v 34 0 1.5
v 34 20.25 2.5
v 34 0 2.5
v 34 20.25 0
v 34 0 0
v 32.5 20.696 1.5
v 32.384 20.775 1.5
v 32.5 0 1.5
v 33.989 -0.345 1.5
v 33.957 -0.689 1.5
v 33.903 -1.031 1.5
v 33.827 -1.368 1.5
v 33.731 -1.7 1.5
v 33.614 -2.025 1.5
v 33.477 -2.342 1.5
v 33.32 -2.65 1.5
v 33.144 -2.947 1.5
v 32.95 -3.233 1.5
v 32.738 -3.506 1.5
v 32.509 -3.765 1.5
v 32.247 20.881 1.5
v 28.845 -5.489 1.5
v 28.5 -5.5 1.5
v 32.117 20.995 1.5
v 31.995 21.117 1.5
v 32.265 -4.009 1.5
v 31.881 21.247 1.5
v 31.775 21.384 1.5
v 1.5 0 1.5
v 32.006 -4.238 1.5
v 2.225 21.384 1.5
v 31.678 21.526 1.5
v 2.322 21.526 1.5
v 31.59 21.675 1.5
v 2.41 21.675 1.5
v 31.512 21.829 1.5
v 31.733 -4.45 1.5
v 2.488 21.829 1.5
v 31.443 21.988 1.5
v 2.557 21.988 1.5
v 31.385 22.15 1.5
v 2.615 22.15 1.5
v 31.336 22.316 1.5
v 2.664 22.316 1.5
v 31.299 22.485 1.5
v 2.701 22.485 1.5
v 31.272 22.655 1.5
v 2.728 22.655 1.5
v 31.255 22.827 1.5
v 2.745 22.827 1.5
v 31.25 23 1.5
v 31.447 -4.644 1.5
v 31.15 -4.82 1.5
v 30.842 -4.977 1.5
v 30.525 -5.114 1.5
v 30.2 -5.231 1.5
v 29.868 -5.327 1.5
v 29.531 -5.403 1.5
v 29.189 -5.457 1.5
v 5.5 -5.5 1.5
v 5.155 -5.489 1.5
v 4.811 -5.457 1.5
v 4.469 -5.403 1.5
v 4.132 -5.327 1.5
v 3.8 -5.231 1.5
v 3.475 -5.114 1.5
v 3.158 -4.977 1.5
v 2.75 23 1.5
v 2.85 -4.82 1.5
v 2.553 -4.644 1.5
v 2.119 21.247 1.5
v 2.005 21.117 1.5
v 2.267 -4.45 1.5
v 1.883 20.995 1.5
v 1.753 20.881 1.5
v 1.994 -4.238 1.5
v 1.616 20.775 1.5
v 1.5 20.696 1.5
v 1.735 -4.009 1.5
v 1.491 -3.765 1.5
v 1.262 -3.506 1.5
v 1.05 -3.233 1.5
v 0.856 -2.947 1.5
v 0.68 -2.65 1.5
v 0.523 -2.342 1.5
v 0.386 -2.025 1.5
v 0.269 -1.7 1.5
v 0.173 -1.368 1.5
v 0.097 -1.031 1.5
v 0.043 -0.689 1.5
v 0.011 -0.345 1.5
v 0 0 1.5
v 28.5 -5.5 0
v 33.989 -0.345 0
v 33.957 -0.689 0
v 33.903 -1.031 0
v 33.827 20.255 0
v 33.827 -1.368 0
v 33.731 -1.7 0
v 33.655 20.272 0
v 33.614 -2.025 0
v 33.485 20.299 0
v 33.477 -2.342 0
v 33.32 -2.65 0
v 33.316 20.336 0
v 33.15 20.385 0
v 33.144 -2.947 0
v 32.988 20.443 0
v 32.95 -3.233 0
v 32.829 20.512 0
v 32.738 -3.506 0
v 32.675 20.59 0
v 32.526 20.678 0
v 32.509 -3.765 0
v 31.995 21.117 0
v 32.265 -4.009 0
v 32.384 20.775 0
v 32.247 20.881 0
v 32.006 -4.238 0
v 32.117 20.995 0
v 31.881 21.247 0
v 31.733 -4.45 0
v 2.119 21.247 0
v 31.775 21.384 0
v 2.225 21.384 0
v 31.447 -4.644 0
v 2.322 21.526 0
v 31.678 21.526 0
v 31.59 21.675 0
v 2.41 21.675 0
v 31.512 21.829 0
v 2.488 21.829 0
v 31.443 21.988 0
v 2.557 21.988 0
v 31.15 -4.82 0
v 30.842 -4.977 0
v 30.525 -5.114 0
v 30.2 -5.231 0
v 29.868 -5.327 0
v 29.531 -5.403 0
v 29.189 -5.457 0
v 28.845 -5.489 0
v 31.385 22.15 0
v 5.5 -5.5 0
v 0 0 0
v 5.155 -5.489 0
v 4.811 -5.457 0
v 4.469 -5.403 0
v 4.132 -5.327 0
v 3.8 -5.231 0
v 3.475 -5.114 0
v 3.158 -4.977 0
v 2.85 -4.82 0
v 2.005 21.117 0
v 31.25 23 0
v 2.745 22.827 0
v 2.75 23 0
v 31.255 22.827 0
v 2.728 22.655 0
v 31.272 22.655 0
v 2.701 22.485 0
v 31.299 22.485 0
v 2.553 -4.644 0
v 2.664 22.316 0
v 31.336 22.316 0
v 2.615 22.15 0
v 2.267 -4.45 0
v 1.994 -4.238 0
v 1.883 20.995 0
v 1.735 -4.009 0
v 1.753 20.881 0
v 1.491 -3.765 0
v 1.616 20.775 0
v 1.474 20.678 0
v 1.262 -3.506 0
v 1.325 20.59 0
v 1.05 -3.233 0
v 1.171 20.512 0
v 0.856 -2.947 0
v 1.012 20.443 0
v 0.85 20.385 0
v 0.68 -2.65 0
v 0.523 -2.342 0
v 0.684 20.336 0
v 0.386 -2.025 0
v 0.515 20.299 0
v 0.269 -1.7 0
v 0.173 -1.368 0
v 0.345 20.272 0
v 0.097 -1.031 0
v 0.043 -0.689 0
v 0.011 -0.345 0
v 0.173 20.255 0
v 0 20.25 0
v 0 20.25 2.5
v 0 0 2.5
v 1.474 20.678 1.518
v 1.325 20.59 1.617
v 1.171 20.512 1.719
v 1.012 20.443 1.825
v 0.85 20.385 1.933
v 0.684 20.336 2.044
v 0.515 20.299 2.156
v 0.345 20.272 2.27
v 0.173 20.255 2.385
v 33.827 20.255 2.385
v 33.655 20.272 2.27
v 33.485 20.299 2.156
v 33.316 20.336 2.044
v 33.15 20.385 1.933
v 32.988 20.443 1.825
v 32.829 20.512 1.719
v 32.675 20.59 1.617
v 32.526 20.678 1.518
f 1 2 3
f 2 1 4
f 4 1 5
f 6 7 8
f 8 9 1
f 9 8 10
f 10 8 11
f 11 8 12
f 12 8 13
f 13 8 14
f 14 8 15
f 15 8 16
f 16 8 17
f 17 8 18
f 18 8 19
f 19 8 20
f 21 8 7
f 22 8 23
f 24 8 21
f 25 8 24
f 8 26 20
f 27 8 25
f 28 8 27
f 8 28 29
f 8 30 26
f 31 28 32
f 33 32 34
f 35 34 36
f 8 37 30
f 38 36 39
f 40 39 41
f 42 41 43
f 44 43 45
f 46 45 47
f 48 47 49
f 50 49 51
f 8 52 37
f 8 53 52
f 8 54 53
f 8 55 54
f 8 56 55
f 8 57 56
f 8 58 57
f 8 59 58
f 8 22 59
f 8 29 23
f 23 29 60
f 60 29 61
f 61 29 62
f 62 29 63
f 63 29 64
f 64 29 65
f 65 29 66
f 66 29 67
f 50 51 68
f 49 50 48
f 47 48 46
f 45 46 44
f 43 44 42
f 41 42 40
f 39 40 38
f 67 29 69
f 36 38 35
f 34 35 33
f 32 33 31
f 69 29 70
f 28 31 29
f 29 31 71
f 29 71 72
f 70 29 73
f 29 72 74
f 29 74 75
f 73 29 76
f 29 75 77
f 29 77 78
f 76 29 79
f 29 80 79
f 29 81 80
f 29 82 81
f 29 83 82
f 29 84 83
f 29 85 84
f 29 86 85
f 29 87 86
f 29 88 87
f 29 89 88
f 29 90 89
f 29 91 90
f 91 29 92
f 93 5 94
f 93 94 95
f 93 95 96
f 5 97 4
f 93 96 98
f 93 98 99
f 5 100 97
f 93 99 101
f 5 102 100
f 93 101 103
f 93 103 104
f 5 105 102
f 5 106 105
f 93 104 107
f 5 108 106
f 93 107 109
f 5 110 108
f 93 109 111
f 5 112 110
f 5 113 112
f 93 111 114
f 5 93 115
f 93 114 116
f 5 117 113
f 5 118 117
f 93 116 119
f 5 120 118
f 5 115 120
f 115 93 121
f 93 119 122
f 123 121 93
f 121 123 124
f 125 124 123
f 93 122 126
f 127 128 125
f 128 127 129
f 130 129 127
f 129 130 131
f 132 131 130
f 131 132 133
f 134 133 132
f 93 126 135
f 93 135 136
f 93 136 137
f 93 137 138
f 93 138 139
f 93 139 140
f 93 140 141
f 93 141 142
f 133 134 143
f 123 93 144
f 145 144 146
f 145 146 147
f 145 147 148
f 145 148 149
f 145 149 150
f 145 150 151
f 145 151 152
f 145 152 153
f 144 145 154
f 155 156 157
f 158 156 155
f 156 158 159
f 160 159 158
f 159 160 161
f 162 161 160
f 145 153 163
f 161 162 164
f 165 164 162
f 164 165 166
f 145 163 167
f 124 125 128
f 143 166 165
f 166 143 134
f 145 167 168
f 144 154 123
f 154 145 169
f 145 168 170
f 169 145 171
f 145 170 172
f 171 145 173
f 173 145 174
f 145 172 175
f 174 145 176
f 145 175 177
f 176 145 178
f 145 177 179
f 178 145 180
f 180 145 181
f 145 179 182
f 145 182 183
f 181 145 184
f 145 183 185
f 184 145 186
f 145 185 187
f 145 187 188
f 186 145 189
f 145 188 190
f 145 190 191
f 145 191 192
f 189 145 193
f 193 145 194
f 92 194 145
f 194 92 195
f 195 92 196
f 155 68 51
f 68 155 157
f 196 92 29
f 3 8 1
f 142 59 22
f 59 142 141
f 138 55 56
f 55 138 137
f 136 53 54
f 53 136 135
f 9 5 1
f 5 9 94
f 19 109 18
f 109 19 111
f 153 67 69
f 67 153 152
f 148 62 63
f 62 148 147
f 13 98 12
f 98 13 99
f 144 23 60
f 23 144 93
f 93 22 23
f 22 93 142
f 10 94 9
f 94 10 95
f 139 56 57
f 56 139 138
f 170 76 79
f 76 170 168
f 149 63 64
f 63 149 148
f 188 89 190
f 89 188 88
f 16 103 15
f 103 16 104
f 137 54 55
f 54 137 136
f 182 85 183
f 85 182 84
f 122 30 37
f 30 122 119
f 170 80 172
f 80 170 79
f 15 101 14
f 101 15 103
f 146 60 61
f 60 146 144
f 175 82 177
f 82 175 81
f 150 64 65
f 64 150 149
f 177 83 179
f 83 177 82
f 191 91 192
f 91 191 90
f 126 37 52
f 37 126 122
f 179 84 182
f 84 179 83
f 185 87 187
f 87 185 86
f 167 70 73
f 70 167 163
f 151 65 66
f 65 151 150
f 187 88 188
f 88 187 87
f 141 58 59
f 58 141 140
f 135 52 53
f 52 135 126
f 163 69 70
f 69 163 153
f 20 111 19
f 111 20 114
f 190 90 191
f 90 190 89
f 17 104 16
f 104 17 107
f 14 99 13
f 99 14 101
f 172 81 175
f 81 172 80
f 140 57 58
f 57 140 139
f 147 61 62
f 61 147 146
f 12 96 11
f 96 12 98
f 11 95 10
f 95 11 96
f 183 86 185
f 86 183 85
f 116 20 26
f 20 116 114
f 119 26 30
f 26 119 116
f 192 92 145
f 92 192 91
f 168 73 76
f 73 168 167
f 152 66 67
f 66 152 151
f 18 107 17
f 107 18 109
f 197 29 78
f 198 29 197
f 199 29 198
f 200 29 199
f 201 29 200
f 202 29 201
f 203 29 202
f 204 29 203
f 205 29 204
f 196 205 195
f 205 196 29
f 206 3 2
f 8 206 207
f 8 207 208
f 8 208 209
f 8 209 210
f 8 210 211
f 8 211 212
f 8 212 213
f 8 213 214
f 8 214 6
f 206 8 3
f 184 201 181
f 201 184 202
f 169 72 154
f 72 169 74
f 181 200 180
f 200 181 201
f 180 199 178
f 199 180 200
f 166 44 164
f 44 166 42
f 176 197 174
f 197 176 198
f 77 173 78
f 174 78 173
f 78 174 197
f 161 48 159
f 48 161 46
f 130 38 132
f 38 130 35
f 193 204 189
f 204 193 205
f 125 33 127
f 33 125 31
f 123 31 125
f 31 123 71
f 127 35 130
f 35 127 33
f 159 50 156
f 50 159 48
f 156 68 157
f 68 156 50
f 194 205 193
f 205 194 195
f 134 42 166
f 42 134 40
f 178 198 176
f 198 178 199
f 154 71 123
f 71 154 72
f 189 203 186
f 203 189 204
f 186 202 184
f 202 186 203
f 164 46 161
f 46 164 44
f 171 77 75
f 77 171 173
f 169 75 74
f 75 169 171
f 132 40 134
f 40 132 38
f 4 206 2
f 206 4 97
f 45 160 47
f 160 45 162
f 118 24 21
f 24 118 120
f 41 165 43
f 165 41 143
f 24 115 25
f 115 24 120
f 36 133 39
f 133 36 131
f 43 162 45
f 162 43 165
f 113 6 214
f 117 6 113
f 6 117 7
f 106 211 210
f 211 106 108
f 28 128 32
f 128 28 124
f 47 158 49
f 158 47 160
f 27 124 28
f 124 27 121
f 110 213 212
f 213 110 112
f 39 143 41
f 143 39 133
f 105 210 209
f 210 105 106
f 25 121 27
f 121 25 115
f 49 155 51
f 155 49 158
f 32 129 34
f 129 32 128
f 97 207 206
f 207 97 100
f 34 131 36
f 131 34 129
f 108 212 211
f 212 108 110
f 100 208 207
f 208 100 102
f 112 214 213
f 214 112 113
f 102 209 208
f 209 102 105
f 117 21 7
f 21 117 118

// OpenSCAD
/*
 * Author:  Jean Philippe Neumann
 * License: Creative Commons Attribution-ShareAlike 3.0 Unported License
 *          see http://creativecommons.org/licenses/by-sa/3.0/
 * URL:     http://www.thingiverse.com/thing:952051
 */

// MakerBot customizer settings:
// preview[view:south east, tilt:top diagonal]

// width of the whole divider in mm.
DIVIDER_WIDTH = 34;
// height of the whole divider in mm.
DIVIDER_HEIGHT = 28.5;
// thickness of the divider (without the side rails) in mm.
DIVIDER_THICKNESS = 1.5;

// height of the rounded bottom part in mm.
DIVIDER_BOTTOM_HEIGHT = 5.5;
// height of the rails on the side in mm.
RAIL_HEIGHT = 1.0;
// width of the rails on the side in mm.
RAIL_WIDTH = 1.5;

// cutouts for lid guide rails in some plano models (e.g. 3500) in mm. Set to 0 to disable.
CUTOUT_RADIUS = 2.75;

DIVIDER_TOP_HEIGHT = DIVIDER_HEIGHT - DIVIDER_BOTTOM_HEIGHT;

createAll();

module createAll() {
  difference() {
    createBody();
    createCutouts();
  }
}

module createBody() {
  union() {
    // main body
    color([1,1,0])
    cube([DIVIDER_WIDTH, DIVIDER_TOP_HEIGHT, DIVIDER_THICKNESS]);

    // rounded bottom
    color([0,0,1])
    hull() {
      translate([DIVIDER_BOTTOM_HEIGHT, 0, 0])
      cylinder(r=DIVIDER_BOTTOM_HEIGHT, h=DIVIDER_THICKNESS, $fn=100);

      translate([DIVIDER_WIDTH - DIVIDER_BOTTOM_HEIGHT, 0, 0])
      cylinder(r=DIVIDER_BOTTOM_HEIGHT, h=DIVIDER_THICKNESS, $fn=100);
    }

    // left rail
    createRail();

    // right rail
    translate([DIVIDER_WIDTH,DIVIDER_TOP_HEIGHT, 0])
    rotate([0,0,180])
    createRail();
  }
}

module createRail() {
  color([0,1,0])
  translate([0,DIVIDER_TOP_HEIGHT,DIVIDER_THICKNESS])
  rotate([90,0,0])
  linear_extrude(height = DIVIDER_TOP_HEIGHT)
  polygon(points = [[0, 0], [RAIL_WIDTH, 0], [0, RAIL_HEIGHT] ], paths = [[0, 1, 2]]);
}

module createCutouts() {
    translate([0, DIVIDER_TOP_HEIGHT, -1])
    cylinder(h = 100, r=CUTOUT_RADIUS, $fn=100);

    translate([DIVIDER_WIDTH, DIVIDER_TOP_HEIGHT, -1])
    cylinder(h = 100, r=CUTOUT_RADIUS, $fn=100);
}
